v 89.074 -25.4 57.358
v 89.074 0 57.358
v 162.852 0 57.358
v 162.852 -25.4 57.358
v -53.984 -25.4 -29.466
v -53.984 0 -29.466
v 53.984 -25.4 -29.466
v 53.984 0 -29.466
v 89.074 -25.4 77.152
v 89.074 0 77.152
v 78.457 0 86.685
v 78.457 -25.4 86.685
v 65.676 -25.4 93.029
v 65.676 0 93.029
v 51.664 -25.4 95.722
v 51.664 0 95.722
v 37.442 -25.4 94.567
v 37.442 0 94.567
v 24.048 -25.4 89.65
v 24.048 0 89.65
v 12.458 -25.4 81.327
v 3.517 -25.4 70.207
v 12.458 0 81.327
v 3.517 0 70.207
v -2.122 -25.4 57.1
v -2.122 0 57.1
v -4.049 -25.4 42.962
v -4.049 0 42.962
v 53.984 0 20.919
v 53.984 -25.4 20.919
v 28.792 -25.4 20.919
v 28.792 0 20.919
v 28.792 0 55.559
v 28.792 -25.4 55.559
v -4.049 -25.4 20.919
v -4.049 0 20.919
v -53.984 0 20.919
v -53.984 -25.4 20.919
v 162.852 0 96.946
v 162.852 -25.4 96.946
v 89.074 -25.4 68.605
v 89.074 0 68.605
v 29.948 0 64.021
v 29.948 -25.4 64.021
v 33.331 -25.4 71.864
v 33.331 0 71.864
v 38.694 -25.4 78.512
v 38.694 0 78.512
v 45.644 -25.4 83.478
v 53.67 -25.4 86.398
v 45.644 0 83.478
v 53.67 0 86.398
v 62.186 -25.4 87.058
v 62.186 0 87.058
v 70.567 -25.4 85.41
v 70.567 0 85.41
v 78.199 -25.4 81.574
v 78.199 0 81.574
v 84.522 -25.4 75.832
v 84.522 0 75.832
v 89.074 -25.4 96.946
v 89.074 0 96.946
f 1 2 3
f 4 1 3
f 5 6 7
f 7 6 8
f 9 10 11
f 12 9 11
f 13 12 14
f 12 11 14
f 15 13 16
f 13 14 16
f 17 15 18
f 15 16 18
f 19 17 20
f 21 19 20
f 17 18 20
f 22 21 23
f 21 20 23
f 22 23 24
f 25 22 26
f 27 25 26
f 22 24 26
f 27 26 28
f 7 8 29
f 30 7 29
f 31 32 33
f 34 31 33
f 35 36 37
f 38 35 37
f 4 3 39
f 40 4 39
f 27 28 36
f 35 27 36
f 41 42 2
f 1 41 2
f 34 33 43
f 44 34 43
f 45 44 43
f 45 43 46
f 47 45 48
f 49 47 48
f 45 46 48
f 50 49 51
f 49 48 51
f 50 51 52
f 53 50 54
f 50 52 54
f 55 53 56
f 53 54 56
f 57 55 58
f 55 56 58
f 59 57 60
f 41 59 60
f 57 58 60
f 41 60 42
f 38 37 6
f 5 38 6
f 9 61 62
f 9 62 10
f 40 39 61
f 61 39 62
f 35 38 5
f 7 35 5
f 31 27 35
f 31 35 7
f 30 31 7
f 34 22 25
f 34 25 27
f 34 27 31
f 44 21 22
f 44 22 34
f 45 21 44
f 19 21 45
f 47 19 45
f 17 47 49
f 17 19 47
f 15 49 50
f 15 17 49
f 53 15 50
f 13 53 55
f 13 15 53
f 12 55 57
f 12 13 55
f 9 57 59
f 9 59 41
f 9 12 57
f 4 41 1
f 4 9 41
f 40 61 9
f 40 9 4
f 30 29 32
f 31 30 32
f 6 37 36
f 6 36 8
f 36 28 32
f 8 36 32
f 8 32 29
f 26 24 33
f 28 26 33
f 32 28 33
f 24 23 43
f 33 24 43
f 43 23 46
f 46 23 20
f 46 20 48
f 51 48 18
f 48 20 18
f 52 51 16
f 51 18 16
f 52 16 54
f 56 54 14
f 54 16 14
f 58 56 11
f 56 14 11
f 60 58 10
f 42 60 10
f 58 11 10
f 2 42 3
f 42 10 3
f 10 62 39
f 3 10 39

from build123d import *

# Parameters (mm, degrees)
F1_DEPTH = 25.4


with BuildPart() as f1:
    # F0 (on Front) → F1 (new body)
    with BuildSketch(Plane.XZ):
        Polygon((-4.048808, 20.918848), (-53.984117, 20.918848), (-53.984117, -29.466329), (53.984117, -29.466329), (53.984117, 20.918848), (28.791532, 20.918848), align=None)
        with BuildLine():
            Line((-4.048808, 42.962365), (-4.048808, 20.918848))
            Line((-4.048808, 20.918848), (28.791532, 20.918848))
            Line((28.791532, 20.918848), (28.791532, 55.558659))
            ThreePointArc((28.791532, 55.558659), (53.670281, 86.397568), (89.073792, 68.604819))
            Line((89.073792, 68.604819), (89.073792, 77.152304))
            ThreePointArc((89.073792, 77.152304), (30.578157, 92.562694), (-4.048808, 42.962365))
        make_face()
        Polygon((89.073792, 96.946478), (89.073792, 77.152304), (89.073792, 68.604819), (89.073792, 57.358131), (162.852123, 57.358131), (162.852123, 96.946478), align=None)
    extrude(amount=F1_DEPTH)


solid = f1.part
